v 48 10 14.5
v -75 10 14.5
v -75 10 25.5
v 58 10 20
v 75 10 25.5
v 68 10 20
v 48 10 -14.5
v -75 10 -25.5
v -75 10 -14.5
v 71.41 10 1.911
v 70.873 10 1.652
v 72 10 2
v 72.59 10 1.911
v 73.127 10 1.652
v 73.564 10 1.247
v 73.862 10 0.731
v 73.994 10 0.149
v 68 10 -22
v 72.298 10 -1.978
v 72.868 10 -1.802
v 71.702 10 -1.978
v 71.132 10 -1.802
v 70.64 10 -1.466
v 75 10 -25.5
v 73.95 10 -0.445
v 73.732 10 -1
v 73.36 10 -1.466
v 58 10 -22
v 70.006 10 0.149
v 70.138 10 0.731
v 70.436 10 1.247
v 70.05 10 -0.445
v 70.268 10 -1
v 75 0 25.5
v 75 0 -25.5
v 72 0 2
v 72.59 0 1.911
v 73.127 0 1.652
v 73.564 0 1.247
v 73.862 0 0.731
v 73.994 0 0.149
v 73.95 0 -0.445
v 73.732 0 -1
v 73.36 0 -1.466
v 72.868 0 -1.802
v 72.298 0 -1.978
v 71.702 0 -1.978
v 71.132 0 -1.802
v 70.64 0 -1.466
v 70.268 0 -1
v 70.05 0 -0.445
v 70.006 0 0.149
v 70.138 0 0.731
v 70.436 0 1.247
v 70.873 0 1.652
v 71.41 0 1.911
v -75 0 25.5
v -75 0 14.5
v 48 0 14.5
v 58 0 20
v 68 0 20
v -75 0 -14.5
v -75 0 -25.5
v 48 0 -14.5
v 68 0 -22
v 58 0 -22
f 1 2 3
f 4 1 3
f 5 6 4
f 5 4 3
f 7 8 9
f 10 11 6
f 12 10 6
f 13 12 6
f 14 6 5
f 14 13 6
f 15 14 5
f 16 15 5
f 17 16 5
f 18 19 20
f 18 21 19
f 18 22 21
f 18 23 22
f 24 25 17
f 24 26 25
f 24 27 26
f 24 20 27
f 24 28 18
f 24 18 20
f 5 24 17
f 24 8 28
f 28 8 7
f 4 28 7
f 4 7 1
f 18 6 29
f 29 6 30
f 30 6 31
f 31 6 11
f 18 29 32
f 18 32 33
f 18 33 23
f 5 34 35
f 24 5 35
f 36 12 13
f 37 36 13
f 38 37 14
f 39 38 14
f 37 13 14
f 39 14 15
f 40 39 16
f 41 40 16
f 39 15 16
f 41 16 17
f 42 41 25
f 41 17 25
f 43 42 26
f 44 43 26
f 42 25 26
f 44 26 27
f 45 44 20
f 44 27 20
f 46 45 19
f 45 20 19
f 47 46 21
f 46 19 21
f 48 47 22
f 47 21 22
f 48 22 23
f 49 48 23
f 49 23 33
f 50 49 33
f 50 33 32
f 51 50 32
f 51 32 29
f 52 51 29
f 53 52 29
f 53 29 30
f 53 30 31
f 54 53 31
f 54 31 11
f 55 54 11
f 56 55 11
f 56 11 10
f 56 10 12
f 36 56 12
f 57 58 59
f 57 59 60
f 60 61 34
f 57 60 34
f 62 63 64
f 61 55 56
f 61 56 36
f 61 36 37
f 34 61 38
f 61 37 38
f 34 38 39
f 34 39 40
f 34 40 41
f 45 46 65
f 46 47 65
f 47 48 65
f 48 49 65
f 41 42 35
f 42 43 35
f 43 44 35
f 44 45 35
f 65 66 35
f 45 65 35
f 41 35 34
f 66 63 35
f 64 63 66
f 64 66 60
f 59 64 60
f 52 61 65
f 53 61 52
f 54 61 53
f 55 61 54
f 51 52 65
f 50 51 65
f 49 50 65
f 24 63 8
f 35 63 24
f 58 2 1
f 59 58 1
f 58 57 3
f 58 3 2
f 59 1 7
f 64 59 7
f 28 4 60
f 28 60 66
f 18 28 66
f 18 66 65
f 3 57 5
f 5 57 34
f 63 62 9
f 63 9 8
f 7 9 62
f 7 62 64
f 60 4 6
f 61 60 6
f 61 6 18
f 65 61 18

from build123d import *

# Parameters (mm, degrees)
SKETCH1_W           = 150
SKETCH1_H           = 51
BOSS_EXTRUDE1_DEPTH = 10
SKETCH2_W           = 10
SKETCH2_H           = 42
CUT_EXTRUDE1_DEPTH  = 80.845162659
SKETCH3_W           = 123
SKETCH3_H           = 29
CUT_EXTRUDE2_DEPTH  = 80.845162659
SKETCH4_R           = 2
CUT_EXTRUDE3_DEPTH  = 80.845162659


with BuildPart() as part:
    # Sketch1 → Boss-Extrude1 (new body)
    with BuildSketch(Plane(origin=(0, 0, 0), x_dir=(1, 0, 0), z_dir=(0, 1, 0))):
        Rectangle(SKETCH1_W, SKETCH1_H)
    extrude(amount=BOSS_EXTRUDE1_DEPTH)

    # Sketch2 → Cut-Extrude1 (cut, through all)
    with BuildSketch(Plane(origin=(0, 10, 0), x_dir=(1, 0, 0), z_dir=(0, 1, 0))):
        with Locations((63, 1)):
            Rectangle(SKETCH2_W, SKETCH2_H)
    extrude(amount=-CUT_EXTRUDE1_DEPTH, mode=Mode.SUBTRACT)

    # Sketch3 → Cut-Extrude2 (cut, through all)
    with BuildSketch(Plane(origin=(0, 10, 0), x_dir=(1, 0, 0), z_dir=(0, 1, 0))):
        with Locations((-13.5, 0)):
            Rectangle(SKETCH3_W, SKETCH3_H)
    extrude(amount=-CUT_EXTRUDE2_DEPTH, mode=Mode.SUBTRACT)

    # Sketch4 → Cut-Extrude3 (cut, through all)
    with BuildSketch(Plane(origin=(0, 10, 0), x_dir=(1, 0, 0), z_dir=(0, 1, 0))):
        with Locations(Location((72, 0, 0), (0, 0, 270))):
            Circle(SKETCH4_R)
    extrude(amount=-CUT_EXTRUDE3_DEPTH, mode=Mode.SUBTRACT)


solid = part.part
